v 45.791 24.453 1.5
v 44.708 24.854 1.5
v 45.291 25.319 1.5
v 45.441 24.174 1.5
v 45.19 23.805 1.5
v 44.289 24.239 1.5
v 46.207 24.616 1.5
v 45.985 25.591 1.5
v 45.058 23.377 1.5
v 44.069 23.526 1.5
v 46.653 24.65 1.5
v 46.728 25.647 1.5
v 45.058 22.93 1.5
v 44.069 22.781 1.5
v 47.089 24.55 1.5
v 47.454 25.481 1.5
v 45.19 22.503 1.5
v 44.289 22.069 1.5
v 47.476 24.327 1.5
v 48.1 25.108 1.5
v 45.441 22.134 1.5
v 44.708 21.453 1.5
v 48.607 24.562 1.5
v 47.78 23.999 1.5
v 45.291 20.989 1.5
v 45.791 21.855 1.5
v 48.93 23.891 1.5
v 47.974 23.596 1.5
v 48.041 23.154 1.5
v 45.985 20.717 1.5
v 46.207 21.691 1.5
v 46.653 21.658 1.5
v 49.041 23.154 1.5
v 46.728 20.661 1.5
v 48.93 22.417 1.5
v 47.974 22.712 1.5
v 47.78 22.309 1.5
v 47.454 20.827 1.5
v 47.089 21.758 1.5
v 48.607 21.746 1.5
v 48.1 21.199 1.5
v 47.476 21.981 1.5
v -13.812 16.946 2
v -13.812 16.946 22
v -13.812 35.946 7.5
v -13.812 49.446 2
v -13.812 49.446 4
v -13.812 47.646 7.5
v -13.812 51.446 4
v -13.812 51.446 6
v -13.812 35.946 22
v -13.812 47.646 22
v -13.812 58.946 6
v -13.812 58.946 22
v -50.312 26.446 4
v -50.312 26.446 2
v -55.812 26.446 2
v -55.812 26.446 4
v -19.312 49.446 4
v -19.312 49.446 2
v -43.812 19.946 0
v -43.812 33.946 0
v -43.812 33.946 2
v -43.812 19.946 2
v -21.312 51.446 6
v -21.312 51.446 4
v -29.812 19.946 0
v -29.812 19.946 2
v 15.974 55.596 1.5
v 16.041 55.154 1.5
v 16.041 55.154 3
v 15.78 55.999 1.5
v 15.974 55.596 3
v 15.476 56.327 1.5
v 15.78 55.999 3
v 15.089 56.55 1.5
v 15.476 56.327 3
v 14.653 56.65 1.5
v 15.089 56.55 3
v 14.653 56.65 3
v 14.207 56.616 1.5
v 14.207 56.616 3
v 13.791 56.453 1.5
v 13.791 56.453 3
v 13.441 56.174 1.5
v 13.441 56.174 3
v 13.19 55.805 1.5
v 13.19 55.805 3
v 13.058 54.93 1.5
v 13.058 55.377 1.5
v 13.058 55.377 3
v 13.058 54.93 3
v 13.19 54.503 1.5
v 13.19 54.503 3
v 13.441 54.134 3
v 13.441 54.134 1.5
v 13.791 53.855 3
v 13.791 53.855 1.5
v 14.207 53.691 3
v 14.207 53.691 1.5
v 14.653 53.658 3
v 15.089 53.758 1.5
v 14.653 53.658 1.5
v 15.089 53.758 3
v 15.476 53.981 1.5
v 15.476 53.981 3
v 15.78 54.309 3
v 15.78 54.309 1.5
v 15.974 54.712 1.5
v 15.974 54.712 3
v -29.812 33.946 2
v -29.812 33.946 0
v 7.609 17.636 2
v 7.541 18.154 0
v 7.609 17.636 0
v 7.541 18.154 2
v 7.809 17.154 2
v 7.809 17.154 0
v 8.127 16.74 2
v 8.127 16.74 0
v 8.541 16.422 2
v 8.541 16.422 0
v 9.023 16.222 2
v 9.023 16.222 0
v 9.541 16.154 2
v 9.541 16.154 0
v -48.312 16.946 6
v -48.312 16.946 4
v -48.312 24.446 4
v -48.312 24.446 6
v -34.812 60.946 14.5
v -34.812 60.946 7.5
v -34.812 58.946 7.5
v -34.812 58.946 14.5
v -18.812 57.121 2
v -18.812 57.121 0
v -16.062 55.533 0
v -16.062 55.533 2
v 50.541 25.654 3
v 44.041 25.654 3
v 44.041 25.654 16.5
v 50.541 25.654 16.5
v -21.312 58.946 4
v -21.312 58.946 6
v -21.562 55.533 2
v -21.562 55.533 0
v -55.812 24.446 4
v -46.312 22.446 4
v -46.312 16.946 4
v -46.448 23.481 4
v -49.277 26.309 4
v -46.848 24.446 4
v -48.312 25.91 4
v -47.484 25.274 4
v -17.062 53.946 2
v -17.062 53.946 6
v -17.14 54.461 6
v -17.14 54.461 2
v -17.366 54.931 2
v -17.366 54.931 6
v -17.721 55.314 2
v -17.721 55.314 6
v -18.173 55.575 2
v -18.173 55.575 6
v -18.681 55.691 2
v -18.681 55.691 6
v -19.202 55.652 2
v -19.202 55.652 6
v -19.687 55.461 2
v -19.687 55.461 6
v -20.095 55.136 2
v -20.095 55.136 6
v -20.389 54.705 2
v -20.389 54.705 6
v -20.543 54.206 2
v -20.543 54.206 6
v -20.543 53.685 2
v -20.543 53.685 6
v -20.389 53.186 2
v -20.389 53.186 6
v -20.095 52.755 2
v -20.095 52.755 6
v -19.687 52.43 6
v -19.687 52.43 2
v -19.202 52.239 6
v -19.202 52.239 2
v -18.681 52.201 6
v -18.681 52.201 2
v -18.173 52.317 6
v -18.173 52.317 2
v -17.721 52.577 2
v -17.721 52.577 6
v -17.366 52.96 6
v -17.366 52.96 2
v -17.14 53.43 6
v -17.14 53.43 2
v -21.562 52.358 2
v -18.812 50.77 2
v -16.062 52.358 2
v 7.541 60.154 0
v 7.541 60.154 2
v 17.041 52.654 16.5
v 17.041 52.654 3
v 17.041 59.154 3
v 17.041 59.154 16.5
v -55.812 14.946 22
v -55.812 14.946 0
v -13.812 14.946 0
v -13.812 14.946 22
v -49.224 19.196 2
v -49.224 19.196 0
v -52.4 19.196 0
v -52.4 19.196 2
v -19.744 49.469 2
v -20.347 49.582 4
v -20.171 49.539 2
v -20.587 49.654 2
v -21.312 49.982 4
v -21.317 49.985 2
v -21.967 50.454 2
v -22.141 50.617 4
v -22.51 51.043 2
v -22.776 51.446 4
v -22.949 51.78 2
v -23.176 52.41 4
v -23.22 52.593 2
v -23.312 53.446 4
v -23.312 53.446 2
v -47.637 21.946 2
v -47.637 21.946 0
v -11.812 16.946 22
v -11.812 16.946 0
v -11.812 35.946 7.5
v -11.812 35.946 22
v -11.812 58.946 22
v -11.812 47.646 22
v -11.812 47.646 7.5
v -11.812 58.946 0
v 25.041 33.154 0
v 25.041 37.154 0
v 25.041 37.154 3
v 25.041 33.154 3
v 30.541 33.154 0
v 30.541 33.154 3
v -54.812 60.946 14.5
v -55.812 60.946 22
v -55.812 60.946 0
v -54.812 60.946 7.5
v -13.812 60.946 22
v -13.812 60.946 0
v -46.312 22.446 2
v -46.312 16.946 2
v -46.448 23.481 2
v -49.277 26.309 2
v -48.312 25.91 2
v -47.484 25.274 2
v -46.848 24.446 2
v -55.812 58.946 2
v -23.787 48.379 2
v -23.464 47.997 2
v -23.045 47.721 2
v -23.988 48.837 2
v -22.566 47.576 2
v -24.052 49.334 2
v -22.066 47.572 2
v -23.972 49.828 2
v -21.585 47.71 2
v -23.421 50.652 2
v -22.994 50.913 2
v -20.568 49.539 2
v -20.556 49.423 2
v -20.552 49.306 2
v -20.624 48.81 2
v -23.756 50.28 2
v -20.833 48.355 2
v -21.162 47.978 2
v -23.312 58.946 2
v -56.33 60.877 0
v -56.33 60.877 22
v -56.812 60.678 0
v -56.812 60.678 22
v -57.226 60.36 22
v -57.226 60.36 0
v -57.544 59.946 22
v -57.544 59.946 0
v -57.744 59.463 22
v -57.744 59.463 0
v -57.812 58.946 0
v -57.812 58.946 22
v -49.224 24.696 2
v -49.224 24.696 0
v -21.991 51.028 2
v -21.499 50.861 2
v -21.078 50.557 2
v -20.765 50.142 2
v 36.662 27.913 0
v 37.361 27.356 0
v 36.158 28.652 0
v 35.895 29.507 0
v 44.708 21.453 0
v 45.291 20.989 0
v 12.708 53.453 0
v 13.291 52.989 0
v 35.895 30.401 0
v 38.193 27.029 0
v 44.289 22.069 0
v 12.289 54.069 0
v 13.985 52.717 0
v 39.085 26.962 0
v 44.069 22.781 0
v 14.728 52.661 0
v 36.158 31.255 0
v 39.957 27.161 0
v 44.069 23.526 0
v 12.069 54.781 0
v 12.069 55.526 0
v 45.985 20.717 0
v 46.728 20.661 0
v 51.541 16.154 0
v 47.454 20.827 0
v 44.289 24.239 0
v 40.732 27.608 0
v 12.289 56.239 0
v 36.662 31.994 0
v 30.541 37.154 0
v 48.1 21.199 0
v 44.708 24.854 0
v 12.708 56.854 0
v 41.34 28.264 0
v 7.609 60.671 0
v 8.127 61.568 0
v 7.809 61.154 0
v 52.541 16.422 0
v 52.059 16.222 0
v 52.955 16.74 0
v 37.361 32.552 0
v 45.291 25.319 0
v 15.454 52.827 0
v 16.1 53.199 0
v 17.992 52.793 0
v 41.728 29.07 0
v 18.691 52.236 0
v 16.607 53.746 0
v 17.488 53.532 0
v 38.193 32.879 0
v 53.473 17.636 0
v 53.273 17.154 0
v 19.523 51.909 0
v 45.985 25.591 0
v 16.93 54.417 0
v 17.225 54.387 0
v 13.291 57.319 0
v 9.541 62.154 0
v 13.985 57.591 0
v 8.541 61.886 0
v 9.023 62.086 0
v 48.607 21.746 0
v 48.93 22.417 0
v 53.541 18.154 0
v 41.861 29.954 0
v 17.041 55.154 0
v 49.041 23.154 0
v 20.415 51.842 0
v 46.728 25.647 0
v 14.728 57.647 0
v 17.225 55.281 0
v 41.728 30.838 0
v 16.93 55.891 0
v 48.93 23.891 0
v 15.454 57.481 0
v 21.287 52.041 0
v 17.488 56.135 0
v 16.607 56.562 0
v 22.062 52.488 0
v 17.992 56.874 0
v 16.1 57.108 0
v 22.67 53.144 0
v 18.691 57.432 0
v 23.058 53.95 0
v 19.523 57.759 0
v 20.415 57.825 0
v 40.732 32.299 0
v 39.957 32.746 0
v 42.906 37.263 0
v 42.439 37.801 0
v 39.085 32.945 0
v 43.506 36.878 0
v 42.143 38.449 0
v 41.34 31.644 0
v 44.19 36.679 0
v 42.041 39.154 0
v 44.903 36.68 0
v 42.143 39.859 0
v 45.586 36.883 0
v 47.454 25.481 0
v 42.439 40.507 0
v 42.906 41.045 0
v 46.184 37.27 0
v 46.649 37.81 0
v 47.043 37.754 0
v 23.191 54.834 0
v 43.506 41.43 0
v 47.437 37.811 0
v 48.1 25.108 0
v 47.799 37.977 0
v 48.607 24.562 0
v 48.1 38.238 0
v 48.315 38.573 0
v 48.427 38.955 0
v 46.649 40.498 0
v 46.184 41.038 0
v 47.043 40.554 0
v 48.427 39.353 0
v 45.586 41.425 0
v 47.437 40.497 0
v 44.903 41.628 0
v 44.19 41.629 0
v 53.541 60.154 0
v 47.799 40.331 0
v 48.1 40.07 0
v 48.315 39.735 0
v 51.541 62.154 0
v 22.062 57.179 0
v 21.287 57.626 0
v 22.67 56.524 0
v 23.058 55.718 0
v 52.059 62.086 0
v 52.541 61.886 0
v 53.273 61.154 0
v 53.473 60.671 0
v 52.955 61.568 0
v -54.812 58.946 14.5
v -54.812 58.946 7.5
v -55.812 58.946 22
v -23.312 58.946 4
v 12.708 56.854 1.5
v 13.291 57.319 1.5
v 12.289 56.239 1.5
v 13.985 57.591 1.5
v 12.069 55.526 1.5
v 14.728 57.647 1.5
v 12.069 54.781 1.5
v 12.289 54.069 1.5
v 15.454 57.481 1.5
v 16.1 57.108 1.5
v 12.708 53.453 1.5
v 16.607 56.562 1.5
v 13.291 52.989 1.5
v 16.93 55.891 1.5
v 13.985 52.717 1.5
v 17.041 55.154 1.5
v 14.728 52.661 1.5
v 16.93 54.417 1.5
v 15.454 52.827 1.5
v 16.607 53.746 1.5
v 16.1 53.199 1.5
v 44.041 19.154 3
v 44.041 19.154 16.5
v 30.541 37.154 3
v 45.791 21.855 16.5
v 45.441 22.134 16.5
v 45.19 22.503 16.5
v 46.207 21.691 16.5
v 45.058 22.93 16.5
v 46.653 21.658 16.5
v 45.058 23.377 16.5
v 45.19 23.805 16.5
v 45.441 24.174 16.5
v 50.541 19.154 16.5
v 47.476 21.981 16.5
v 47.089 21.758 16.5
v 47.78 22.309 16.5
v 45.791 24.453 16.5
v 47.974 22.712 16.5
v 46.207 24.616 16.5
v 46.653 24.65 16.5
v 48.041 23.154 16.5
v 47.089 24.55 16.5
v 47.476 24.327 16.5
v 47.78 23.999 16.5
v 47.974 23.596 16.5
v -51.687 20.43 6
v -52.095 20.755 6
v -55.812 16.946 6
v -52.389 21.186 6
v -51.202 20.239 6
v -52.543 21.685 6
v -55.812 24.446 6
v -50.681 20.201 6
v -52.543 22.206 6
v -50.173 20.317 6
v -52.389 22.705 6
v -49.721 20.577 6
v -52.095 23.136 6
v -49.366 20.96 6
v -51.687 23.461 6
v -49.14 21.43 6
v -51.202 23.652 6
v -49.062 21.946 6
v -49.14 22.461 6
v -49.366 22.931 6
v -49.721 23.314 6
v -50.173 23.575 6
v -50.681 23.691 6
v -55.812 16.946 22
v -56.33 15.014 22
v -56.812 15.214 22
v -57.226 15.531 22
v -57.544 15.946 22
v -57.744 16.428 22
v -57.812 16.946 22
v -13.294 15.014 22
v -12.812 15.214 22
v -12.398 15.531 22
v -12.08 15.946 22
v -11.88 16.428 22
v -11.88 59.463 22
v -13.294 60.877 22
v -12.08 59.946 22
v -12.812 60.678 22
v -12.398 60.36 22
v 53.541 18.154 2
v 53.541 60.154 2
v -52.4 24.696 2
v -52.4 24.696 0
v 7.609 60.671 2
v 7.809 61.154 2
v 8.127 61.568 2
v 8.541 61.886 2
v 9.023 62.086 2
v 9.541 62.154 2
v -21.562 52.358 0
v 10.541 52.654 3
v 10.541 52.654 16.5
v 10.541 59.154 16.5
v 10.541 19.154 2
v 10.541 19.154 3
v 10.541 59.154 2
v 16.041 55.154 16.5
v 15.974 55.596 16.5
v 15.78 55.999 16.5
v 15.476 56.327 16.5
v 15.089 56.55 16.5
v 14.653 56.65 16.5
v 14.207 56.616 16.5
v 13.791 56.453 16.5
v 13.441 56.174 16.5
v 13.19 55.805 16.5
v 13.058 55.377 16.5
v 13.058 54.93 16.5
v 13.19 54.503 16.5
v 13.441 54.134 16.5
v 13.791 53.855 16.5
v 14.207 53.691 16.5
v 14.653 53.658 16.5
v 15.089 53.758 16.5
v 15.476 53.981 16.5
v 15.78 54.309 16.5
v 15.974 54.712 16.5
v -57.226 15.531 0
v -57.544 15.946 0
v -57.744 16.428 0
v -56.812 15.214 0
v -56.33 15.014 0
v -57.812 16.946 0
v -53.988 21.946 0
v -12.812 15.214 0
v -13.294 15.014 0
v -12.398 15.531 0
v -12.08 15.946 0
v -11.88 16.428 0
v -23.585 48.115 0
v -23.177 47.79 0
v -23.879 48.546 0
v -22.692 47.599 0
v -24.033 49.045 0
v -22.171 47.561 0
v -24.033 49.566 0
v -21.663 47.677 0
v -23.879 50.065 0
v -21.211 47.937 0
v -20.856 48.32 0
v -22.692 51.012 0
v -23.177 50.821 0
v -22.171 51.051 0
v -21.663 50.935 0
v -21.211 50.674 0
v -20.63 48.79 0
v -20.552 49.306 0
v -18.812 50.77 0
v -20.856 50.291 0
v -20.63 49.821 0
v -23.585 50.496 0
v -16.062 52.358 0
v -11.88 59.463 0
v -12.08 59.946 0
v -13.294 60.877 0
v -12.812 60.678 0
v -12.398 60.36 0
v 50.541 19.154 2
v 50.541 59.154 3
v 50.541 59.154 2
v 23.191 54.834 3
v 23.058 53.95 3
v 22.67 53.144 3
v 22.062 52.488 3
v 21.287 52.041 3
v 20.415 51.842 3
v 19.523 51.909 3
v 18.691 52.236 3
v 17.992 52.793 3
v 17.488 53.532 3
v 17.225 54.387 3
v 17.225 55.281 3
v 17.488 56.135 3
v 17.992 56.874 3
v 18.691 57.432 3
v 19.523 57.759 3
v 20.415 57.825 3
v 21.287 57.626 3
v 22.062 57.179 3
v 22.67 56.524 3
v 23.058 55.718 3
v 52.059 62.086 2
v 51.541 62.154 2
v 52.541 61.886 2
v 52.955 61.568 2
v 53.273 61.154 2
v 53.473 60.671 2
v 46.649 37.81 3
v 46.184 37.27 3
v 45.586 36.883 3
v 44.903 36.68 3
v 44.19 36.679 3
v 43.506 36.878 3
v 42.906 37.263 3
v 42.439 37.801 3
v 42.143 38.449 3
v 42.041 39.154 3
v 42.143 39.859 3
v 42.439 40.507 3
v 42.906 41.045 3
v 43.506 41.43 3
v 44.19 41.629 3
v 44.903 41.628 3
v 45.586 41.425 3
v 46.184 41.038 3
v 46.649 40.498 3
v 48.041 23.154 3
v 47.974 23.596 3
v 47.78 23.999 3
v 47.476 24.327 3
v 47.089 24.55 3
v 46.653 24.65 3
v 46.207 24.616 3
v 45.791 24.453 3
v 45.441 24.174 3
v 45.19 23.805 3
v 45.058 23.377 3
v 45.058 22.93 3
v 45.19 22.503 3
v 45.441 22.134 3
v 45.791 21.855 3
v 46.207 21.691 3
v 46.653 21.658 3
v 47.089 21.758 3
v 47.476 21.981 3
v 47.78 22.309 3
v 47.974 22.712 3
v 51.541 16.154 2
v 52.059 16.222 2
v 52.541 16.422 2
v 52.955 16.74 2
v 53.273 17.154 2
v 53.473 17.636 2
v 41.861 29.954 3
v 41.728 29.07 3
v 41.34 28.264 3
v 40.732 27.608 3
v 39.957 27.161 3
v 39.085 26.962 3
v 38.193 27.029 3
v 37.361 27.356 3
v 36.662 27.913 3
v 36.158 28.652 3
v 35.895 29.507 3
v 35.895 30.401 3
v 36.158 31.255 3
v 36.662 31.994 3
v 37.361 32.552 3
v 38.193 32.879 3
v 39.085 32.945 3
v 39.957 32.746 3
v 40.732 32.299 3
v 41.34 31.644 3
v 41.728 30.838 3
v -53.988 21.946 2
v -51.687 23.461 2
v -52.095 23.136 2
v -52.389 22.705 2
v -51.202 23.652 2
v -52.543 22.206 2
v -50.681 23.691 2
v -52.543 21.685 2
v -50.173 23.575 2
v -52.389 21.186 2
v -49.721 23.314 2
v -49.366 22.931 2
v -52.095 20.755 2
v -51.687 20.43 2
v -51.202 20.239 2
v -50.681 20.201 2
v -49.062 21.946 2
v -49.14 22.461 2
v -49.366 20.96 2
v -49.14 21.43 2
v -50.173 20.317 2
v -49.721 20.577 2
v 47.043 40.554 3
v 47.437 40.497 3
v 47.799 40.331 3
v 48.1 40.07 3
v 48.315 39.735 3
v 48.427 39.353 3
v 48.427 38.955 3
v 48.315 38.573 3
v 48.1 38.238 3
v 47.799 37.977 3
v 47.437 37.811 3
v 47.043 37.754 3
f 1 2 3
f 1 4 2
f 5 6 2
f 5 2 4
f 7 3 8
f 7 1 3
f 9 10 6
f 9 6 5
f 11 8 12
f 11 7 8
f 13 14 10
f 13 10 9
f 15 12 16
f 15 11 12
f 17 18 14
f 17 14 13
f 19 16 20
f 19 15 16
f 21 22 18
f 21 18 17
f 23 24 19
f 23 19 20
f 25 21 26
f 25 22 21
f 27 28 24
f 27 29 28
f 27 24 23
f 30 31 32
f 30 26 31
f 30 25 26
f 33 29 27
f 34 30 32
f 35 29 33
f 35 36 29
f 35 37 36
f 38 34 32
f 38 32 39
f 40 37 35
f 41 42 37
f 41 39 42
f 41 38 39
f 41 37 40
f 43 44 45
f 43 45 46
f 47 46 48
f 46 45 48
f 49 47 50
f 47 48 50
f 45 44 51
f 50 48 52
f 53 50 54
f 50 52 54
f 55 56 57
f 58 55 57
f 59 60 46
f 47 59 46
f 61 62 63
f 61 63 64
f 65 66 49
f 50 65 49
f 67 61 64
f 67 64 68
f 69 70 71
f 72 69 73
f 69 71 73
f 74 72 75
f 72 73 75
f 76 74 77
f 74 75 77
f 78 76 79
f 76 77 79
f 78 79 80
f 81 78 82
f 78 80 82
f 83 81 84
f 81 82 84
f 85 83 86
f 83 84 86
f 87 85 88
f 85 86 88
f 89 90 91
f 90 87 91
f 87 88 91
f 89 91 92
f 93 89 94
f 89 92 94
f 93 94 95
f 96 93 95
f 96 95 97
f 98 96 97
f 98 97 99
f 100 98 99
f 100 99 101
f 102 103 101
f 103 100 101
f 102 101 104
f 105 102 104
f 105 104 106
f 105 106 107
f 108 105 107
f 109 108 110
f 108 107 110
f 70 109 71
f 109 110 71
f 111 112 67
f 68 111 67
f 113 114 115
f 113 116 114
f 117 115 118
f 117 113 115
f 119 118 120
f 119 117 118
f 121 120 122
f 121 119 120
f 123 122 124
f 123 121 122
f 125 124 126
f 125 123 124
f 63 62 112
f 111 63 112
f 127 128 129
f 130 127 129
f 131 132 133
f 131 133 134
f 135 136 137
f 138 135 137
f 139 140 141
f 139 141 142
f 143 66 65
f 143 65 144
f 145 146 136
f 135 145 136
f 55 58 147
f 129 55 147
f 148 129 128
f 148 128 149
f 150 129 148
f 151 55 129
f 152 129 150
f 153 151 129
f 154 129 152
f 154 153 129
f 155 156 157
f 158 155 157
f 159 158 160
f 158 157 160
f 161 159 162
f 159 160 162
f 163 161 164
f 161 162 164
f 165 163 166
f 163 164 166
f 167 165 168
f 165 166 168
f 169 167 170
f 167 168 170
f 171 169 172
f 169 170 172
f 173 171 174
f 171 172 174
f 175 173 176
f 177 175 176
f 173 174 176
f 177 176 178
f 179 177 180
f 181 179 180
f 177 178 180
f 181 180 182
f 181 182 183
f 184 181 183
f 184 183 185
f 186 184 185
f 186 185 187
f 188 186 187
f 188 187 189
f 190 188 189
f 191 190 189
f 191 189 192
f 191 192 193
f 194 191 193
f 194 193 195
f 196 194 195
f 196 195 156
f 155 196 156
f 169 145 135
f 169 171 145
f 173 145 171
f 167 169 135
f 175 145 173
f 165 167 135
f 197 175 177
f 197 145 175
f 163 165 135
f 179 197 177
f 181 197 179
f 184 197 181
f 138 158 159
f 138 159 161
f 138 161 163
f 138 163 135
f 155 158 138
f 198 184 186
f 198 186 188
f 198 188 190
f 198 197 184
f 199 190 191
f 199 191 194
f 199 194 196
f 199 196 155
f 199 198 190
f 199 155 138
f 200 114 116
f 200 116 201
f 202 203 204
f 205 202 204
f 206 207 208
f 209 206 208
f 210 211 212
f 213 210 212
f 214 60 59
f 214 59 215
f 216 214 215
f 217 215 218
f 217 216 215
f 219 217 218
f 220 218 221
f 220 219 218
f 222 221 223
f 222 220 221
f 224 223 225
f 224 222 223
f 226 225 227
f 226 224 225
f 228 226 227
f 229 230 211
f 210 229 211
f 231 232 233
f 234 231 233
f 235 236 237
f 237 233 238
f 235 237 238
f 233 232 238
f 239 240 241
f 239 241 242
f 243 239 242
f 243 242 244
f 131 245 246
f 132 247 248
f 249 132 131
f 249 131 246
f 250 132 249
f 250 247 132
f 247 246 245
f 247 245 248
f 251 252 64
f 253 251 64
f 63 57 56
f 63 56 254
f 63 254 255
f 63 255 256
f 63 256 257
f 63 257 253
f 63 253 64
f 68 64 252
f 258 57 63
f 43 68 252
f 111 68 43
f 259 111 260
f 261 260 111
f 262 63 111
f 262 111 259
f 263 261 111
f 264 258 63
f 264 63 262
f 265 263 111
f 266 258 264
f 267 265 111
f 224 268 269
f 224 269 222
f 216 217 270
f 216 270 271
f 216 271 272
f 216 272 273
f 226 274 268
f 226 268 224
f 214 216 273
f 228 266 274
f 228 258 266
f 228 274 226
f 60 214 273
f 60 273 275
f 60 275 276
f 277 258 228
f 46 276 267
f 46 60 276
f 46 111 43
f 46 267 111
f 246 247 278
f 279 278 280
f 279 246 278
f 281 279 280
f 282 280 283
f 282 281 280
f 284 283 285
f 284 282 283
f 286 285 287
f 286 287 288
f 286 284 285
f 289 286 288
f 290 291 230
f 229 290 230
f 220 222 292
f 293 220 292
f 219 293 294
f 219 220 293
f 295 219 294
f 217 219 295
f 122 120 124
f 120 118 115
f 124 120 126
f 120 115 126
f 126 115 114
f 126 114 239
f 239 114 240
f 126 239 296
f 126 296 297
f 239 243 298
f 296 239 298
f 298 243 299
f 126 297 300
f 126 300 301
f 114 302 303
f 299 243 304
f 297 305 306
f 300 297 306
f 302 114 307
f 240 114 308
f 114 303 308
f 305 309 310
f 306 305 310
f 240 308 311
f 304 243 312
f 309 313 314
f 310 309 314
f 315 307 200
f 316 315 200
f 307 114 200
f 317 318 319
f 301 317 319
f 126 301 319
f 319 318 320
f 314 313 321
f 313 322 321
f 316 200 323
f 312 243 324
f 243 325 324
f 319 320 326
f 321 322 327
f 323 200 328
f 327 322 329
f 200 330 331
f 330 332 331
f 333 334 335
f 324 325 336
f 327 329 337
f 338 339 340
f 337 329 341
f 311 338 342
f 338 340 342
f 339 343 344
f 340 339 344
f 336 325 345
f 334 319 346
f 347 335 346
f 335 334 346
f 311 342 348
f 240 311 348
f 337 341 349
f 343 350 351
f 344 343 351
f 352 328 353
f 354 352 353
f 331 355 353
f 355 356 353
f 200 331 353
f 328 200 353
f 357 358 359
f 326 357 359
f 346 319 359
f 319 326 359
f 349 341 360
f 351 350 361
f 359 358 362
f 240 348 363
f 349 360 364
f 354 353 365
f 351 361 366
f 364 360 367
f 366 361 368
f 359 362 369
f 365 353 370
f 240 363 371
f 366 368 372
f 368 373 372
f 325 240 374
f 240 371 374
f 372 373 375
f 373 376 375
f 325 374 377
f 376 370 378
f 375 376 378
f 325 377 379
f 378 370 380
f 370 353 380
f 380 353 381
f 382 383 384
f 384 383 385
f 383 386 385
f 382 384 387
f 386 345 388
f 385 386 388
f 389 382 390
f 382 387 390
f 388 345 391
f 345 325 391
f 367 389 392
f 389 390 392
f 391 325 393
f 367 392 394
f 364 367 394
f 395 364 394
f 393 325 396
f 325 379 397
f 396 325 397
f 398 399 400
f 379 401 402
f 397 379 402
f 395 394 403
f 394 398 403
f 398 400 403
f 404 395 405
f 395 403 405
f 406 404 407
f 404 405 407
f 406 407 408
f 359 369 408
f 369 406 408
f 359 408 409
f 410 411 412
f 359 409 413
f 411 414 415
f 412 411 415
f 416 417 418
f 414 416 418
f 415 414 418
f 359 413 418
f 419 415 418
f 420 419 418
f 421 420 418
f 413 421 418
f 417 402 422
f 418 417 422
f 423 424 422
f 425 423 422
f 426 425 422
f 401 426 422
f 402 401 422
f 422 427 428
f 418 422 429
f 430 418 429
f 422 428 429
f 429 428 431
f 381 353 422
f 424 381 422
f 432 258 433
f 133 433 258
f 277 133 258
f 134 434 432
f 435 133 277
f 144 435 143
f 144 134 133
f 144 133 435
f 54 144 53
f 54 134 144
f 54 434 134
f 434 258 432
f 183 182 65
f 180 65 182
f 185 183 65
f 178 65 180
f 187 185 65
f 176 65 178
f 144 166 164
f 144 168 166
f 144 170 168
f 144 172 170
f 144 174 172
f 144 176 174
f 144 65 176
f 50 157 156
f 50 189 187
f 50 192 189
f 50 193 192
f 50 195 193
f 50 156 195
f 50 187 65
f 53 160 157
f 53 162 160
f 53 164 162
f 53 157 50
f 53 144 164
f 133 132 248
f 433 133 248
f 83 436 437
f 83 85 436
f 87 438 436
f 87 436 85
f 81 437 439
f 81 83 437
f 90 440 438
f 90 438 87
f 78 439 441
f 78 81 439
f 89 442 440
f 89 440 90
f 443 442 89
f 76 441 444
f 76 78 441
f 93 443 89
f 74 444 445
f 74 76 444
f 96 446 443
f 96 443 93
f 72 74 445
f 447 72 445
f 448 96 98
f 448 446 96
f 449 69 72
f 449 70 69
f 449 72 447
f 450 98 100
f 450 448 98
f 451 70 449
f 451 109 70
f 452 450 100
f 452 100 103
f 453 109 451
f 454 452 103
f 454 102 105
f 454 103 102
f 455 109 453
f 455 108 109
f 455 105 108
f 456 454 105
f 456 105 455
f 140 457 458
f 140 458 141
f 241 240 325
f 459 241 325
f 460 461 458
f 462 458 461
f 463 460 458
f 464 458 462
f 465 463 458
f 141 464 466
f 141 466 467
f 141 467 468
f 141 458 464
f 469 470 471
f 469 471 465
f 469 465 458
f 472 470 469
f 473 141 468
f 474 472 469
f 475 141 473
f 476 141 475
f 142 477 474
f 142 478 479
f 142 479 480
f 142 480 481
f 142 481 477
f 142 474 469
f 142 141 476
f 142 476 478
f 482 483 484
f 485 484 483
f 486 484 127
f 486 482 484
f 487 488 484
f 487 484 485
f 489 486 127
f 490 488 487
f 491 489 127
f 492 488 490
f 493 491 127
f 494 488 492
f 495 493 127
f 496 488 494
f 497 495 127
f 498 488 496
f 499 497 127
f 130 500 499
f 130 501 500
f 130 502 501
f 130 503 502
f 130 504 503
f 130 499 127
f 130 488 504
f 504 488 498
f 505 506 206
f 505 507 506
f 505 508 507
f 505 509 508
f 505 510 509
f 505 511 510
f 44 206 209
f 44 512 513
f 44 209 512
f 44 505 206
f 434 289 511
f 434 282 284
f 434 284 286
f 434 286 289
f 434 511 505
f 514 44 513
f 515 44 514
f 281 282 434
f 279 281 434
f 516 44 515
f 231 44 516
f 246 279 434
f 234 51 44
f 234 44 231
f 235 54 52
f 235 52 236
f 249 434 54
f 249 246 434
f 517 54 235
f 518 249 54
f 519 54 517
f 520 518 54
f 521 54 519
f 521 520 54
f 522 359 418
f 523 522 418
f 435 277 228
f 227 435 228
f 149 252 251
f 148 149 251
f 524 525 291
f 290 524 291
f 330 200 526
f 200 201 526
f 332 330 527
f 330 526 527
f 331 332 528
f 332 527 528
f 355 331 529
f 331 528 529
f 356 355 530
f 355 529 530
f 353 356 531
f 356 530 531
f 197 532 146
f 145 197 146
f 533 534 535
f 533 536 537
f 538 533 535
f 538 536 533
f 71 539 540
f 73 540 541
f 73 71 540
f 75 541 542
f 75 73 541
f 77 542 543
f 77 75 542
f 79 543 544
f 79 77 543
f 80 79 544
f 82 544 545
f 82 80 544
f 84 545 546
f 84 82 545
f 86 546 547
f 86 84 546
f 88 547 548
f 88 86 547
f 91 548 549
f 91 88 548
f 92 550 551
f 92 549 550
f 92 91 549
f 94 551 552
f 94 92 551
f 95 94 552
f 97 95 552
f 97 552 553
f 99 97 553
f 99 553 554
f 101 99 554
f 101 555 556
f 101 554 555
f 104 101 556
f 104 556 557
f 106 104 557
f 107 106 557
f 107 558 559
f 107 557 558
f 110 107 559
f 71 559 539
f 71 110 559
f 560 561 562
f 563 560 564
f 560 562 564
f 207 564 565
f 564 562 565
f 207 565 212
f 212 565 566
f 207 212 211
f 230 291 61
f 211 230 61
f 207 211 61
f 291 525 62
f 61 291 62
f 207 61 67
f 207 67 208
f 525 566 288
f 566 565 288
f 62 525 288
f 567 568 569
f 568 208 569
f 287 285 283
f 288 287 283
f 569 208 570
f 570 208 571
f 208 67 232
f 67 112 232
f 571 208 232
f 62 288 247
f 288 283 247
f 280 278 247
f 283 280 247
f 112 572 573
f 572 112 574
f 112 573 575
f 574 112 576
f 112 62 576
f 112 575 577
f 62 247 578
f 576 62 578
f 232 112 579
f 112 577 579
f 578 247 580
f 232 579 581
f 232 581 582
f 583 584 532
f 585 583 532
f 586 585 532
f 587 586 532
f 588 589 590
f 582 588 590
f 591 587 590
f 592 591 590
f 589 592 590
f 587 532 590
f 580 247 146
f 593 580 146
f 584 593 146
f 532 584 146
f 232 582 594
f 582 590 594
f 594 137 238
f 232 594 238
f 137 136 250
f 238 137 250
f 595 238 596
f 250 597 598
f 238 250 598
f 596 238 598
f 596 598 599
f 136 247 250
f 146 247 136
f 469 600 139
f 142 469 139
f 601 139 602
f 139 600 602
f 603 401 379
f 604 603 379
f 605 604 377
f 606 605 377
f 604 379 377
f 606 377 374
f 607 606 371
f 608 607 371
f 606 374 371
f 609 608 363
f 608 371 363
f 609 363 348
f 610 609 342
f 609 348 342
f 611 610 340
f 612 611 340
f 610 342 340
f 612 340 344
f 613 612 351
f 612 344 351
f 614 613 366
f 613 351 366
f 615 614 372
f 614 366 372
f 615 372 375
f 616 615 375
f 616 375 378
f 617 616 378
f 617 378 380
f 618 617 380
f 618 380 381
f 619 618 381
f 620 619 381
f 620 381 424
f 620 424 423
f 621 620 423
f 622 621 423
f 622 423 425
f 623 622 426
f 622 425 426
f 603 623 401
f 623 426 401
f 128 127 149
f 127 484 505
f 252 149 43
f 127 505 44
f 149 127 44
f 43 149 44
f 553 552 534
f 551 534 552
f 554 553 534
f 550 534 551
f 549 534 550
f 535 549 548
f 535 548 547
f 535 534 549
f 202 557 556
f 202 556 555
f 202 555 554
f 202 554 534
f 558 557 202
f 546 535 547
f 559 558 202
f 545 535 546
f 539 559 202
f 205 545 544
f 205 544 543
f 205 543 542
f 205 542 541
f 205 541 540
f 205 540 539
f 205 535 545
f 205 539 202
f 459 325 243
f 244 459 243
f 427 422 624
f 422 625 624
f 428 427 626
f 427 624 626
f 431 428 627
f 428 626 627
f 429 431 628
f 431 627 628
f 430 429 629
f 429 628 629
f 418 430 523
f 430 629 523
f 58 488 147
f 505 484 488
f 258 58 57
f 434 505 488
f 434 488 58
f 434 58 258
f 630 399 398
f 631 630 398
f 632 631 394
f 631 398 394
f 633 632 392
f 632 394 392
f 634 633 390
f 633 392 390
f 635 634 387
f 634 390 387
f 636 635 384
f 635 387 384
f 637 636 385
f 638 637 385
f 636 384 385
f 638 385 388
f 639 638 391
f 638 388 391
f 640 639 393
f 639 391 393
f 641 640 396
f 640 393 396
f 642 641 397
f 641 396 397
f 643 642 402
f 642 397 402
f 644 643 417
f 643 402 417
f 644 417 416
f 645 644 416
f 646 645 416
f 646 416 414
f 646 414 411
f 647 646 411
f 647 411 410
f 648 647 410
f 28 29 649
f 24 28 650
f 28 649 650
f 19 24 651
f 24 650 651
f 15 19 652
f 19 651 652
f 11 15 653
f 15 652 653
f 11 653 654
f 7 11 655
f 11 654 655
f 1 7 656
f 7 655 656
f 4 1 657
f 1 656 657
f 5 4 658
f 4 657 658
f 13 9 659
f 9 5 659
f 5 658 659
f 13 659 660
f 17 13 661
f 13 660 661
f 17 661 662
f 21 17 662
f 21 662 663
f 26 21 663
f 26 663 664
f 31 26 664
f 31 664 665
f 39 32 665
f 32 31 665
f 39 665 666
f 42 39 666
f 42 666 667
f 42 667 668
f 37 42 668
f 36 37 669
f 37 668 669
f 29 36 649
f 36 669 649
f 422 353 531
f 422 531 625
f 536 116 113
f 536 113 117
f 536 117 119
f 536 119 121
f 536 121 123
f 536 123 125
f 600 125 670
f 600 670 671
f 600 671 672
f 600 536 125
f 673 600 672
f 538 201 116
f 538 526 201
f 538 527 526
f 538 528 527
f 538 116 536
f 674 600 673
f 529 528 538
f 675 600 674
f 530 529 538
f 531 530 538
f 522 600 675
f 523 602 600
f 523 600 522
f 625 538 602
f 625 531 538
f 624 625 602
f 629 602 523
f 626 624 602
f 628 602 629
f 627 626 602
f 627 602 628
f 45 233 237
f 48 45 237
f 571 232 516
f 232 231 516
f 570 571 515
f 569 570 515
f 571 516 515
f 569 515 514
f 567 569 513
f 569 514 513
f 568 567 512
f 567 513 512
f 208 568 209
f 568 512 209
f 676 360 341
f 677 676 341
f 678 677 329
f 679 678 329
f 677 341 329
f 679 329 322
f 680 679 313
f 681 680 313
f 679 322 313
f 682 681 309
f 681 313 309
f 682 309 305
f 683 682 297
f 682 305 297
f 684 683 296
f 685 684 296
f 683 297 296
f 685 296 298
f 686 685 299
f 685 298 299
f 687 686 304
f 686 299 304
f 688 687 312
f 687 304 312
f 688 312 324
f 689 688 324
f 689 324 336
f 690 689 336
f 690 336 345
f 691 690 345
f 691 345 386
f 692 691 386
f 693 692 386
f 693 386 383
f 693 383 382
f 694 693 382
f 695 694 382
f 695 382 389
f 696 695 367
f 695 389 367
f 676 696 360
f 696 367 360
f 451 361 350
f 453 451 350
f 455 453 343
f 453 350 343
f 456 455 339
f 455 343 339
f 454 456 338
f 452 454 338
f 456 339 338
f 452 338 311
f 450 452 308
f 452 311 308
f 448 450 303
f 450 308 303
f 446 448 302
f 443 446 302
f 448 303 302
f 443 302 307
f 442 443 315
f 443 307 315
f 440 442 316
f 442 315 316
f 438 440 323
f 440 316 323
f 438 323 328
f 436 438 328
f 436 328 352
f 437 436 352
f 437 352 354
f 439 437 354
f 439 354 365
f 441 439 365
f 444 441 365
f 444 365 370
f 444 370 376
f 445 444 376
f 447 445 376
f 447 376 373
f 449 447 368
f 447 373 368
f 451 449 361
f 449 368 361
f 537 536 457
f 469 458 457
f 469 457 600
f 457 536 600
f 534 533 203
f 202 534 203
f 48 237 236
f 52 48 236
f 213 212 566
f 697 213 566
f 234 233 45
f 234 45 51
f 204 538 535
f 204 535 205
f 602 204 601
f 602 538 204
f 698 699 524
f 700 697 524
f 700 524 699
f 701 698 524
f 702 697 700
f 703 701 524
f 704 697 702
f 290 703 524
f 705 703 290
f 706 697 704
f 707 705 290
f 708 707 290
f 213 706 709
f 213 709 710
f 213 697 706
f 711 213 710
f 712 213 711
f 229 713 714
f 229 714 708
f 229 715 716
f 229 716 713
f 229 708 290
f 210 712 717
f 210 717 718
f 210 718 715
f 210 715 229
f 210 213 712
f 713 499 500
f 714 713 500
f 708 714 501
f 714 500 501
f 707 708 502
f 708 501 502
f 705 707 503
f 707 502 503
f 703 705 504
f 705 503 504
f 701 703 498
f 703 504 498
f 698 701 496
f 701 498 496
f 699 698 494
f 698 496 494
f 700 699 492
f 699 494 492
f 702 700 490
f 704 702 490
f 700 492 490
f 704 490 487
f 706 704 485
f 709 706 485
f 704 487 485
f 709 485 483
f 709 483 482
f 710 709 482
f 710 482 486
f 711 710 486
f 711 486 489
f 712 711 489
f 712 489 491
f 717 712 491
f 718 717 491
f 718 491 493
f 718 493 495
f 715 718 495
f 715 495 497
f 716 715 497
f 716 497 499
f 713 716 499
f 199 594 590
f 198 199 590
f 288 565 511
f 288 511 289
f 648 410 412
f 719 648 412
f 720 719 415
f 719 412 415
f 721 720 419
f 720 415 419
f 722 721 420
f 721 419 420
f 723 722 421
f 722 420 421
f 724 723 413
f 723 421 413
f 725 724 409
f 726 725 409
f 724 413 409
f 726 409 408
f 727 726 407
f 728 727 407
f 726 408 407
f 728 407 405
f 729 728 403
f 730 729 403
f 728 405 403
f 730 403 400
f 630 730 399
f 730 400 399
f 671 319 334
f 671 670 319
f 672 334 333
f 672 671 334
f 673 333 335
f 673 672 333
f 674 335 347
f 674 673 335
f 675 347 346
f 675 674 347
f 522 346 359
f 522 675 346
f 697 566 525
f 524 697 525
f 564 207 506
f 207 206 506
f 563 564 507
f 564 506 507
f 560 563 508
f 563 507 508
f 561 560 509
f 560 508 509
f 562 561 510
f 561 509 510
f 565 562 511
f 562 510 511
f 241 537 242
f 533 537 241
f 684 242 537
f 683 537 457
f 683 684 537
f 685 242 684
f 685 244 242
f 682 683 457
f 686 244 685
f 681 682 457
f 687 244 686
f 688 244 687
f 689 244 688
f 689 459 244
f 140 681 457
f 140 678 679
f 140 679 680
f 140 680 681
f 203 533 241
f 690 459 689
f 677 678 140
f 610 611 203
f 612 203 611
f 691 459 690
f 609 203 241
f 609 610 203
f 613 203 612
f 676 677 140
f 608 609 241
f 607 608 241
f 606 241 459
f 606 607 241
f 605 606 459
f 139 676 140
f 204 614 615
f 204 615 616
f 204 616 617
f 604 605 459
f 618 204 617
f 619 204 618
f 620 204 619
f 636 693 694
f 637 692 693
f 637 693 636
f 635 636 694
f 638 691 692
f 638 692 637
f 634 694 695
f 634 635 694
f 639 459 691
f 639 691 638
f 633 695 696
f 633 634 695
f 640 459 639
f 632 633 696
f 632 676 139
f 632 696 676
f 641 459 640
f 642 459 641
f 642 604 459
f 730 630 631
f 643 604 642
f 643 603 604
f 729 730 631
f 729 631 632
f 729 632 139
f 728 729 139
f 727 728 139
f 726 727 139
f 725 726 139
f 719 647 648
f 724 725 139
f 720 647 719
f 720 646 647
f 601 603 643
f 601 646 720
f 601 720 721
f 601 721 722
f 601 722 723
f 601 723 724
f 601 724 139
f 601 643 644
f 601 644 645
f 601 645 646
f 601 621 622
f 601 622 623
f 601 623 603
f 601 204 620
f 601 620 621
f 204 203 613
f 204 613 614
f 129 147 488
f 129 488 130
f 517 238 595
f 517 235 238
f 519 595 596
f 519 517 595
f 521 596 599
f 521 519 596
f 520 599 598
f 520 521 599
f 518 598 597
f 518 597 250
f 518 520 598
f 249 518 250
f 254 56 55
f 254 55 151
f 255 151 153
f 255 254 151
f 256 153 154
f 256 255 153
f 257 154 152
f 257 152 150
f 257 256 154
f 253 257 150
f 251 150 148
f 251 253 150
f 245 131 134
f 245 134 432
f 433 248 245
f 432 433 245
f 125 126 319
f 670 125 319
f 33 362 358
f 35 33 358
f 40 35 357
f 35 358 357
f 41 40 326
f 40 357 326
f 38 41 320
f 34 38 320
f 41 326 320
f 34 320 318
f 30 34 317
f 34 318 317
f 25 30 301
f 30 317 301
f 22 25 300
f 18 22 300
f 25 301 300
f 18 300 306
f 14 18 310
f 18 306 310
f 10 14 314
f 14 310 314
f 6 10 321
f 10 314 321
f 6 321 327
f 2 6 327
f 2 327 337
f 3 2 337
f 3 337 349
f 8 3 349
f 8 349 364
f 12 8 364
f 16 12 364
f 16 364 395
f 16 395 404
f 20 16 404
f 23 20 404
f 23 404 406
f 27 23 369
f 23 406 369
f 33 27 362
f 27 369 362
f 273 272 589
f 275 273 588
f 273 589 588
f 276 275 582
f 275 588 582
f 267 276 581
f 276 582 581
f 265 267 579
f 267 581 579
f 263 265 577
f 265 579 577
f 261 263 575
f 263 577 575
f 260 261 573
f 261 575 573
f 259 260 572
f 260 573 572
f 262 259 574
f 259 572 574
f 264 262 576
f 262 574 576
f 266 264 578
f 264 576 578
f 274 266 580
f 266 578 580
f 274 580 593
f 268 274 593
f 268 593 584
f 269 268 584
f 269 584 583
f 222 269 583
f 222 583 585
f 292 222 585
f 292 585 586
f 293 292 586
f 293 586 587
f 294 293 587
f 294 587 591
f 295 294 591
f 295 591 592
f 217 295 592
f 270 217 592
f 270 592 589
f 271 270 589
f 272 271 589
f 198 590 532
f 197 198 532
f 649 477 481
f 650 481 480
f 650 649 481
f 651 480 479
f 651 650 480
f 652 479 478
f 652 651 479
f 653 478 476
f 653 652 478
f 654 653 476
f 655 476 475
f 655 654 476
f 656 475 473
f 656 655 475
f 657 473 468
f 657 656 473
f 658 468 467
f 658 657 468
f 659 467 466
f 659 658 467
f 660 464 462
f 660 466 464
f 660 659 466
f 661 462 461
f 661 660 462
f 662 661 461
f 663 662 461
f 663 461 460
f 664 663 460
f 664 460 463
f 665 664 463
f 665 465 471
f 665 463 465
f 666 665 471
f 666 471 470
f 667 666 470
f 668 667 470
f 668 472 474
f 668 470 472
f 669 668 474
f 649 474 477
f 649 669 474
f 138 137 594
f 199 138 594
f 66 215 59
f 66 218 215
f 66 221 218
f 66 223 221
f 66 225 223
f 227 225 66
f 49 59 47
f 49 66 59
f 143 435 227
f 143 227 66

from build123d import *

# Parameters (mm, degrees)
F0_W         = 46
F0_H         = 46
F1_DEPTH     = 22
F2_W         = 42
F2_H         = 42
F3_DEPTH     = 20
F4_W         = 7.5
F4_H         = 7.5
F5_DEPTH     = 4
F7_W         = 2
F7_H         = 7.5
F8_DEPTH     = 2
F10_DEPTH    = 2
F11_W        = 46
F11_H        = 46
F12_DEPTH    = 2
F13_W        = 40
F13_H        = 40
F14_DEPTH    = 1
F15_W        = 6.5
F15_H        = 6.5
F16_DEPTH    = 13.5
F17_R        = 1.5
F18_DEPTH    = 25
F19_DEPTH    = 25
F20_W        = 11.7
F20_H        = 14.5
F21_DEPTH    = 2
F22_W        = 20
F22_H        = 7
F23_DEPTH    = 2
F24_R        = 3
F24_W        = 5.5
F24_H        = 4
F25_DEPTH    = 3
F26_W        = 14
F26_H        = 14
F26_R        = 1.75
F28_DEPTH    = 2
F27_R        = 2.5
F27_R_2      = 1.5
F29_DEPTH    = 1.5
F6_R         = 1.75
F30_DEPTH    = 25
F31_T1_DEPTH = 12
F32_R        = 2
F32_2_R      = 2


# Not quite as in the source:
# - a fillet or chamfer that OpenCascade refuses, or shapes differently, is made with other operations: its cross-section is extruded or revolved along the edge and cut away or added
# - a feature names something its author has since deleted; it is built from what else it names


with BuildPart() as f1:
    # F0 (on Top) → F1 (new body)
    with BuildSketch(Plane.XY):
        with Locations((-34.8121308275, 37.9456170828)):
            Rectangle(F0_W, F0_H)
    extrude(amount=F1_DEPTH)

    # F2 (on face) → F3 (cut)
    with BuildSketch(Plane.XY.offset(22)):
        with Locations((-34.8121308275, 37.9456170828)):
            Rectangle(F2_W, F2_H)
    extrude(amount=-F3_DEPTH, mode=Mode.SUBTRACT)

    # F4 (on face) → F5 (join)
    with BuildSketch(Plane.XY.offset(2)):
        with Locations((-52.0621308275, 20.6956170828)):
            Rectangle(F4_W, F4_H)
        with Locations((-17.5621308275, 55.1956170828)):
            Rectangle(F4_W, F4_H)
    extrude(amount=F5_DEPTH)

    # F7 (on face) → F8 (join)
    with BuildSketch(Plane.XY.offset(2)):
        Polygon((-46.3121308275, 26.4456170828), (-55.8121308275, 26.4456170828), (-55.8121308275, 24.4456170828), (-48.3121308275, 24.4456170828), (-46.3121308275, 24.4456170828), align=None)
        with Locations((-47.3121308275, 20.6956170828)):
            Rectangle(F7_W, F7_H)
        with Locations((-22.3121308275, 55.1956170828)):
            Rectangle(F7_W, F7_H)
        Polygon((-13.8121308275, 51.4456170828), (-21.3121308275, 51.4456170828), (-23.3121308275, 51.4456170828), (-23.3121308275, 49.4456170828), (-13.8121308275, 49.4456170828), align=None)
    extrude(amount=F8_DEPTH)

    # F9 (on face) → F10 (cut)
    with BuildSketch(Plane(origin=(0, 0, 0), x_dir=(1, 0, 0), z_dir=(0, 0, -1))):
        Polygon((-16.0621308275, -55.5333303231), (-16.0621308275, -52.3579038425), (-18.8121308275, -50.7701906023), (-21.5621308275, -52.3579038425), (-21.5621308275, -55.5333303231), (-18.8121308275, -57.1210435634), align=None)
        Polygon((-47.6367043469, -21.9456170828), (-49.2244175872, -19.1956170828), (-52.3998440677, -19.1956170828), (-53.987557308, -21.9456170828), (-52.3998440677, -24.6956170828), (-49.2244175872, -24.6956170828), align=None)
    extrude(amount=-F10_DEPTH, mode=Mode.SUBTRACT)

    # F20 (on face) → F21 (cut)
    with BuildSketch(Plane.YZ.offset(-11.8121308275)):
        with Locations((41.7956170828, 14.75)):
            Rectangle(F20_W, F20_H)
    extrude(amount=-F21_DEPTH, mode=Mode.SUBTRACT)

    # F22 (on face) → F23 (cut)
    with BuildSketch(Plane(origin=(0, 60.9456170828, 0), x_dir=(-1, 0, 0), z_dir=(0, 1, 0))):
        with Locations((44.8121308275, 11)):
            Rectangle(F22_W, F22_H)
    extrude(amount=-F23_DEPTH, mode=Mode.SUBTRACT)

    # F26 (on face) → F28 (cut)
    with BuildSketch(Plane(origin=(0, 0, 0), x_dir=(1, 0, 0), z_dir=(0, 0, -1))):
        with Locations((-36.8121308275, -26.9456170828)):
            Rectangle(F26_W, F26_H)
        with Locations((-22.3021308275, -49.3056170828)):
            Circle(F26_R)
    extrude(amount=-F28_DEPTH, mode=Mode.SUBTRACT)

    # F6 (on face) → F30 (cut)
    with BuildSketch(Plane.XY.offset(22)):
        with Locations((-18.8121308275, 53.9456170828)):
            Circle(F6_R)
        with Locations((-50.8121308275, 21.9456170828)):
            Circle(F6_R)
    extrude(amount=-F30_DEPTH, mode=Mode.SUBTRACT)

    # F31: fillet of radius 4 on 2 edges, made by hand

    # F31_s2 → F31_t1 (cut)
    with BuildSketch(Plane.XY.offset(2)):
        with BuildLine():
            ThreePointArc((-50.3121308275, 26.4456170828), (-47.4837037027, 25.2740442076), (-46.3121308275, 22.4456170828))
            Line((-46.3121308275, 22.4456170828), (-46.3121308275, 26.4456170828))
            Line((-46.3121308275, 26.4456170828), (-50.3121308275, 26.4456170828))
        make_face()
        with BuildLine():
            ThreePointArc((-19.3121308275, 49.4456170828), (-22.1405579522, 50.6171899581), (-23.3121308275, 53.4456170828))
            Line((-23.3121308275, 53.4456170828), (-23.3121308275, 49.4456170828))
            Line((-23.3121308275, 49.4456170828), (-19.3121308275, 49.4456170828))
        make_face()
    extrude(amount=F31_T1_DEPTH, mode=Mode.SUBTRACT)

    # F32
    f32_edges = [f1.edges().sort_by_distance(p)[0] for p in [
        (-57.812131, 14.945617, 11),
        (-57.812131, 60.945617, 11),
        (-11.812131, 60.945617, 11),
        (-11.812131, 14.945617, 11),
    ]]
    fillet(f32_edges, radius=F32_R)


with BuildPart() as f12:
    # F11 (on Top) → F12 (new body)
    with BuildSketch(Plane.XY):
        with Locations((30.5410524812, 39.1538485997)):
            Rectangle(F11_W, F11_H)
    extrude(amount=F12_DEPTH)

    # F13 (on face) → F14 (join)
    with BuildSketch(Plane.XY.offset(2)):
        with Locations((30.5410524812, 39.1538485997)):
            Rectangle(F13_W, F13_H)
    extrude(amount=F14_DEPTH)

    # F15 (on face) → F16 (join)
    with BuildSketch(Plane.XY.offset(3)):
        with Locations((13.7910524812, 55.9038485997)):
            Rectangle(F15_W, F15_H)
        with Locations((47.2910524812, 22.4038485997)):
            Rectangle(F15_W, F15_H)
    extrude(amount=F16_DEPTH)

    # F17 (on face) → F18 (cut)
    with BuildSketch(Plane.XY.offset(3)):
        with Locations((14.5410524812, 55.1538485997)):
            Circle(F17_R)
        with Locations((46.5410524812, 23.1538485997)):
            Circle(F17_R)
    extrude(amount=F18_DEPTH, mode=Mode.SUBTRACT)

    # F17 (on face) → F19 (cut)
    with BuildSketch(Plane.XY.offset(3)):
        with Locations((14.5410524812, 55.1538485997)):
            Circle(F17_R)
        with Locations((46.5410524812, 23.1538485997)):
            Circle(F17_R)
    extrude(amount=-F19_DEPTH, mode=Mode.SUBTRACT)

    # F24 (on face) → F25 (cut)
    with BuildSketch(Plane(origin=(0, 0, 0), x_dir=(1, 0, 0), z_dir=(0, 0, -1))):
        with Locations((38.8610524812, -29.9538485997)):
            Circle(F24_R)
        with Locations((27.7910524812, -35.1538485997)):
            Rectangle(F24_W, F24_H)
        with Locations((20.1910524812, -54.8338485997)):
            Circle(F24_R)
        with BuildLine():
            ThreePointArc((46.6490524812, -40.4978485997), (45.6410524812, -39.1538485997), (46.6490524812, -37.8098485997))
            ThreePointArc((46.6490524812, -37.8098485997), (42.0410524812, -39.1538485997), (46.6490524812, -40.4978485997))
        make_face()
        with BuildLine():
            ThreePointArc((46.6490524812, -37.8098485997), (46.9410524812, -38.4538485997), (47.0410524812, -39.1538485997))
            ThreePointArc((47.0410524812, -39.1538485997), (46.9410524812, -39.8538485997), (46.6490524812, -40.4978485997))
            ThreePointArc((46.6490524812, -40.4978485997), (47.8810524812, -40.2738485997), (48.4410524812, -39.1538485997))
            ThreePointArc((48.4410524812, -39.1538485997), (47.8810524812, -38.0338485997), (46.6490524812, -37.8098485997))
        make_face()
        with BuildLine():
            ThreePointArc((46.6490524812, -40.4978485997), (46.9410524812, -39.8538485997), (47.0410524812, -39.1538485997))
            ThreePointArc((47.0410524812, -39.1538485997), (46.9410524812, -38.4538485997), (46.6490524812, -37.8098485997))
            ThreePointArc((46.6490524812, -37.8098485997), (45.6410524812, -39.1538485997), (46.6490524812, -40.4978485997))
        make_face()
    extrude(amount=-F25_DEPTH, mode=Mode.SUBTRACT)

    # F27 (on face) → F29 (cut)
    with BuildSketch(Plane(origin=(0, 0, 0), x_dir=(1, 0, 0), z_dir=(0, 0, -1))):
        with Locations((14.5410524812, -55.1538485997)):
            Circle(F27_R)
        with Locations((14.5410524812, -55.1538485997)):
            Circle(F27_R_2, mode=Mode.SUBTRACT)
        with Locations((46.5410524812, -23.1538485997)):
            Circle(F27_R)
        with Locations((46.5410524812, -23.1538485997)):
            Circle(F27_R_2, mode=Mode.SUBTRACT)
    extrude(amount=-F29_DEPTH, mode=Mode.SUBTRACT)

    # F32#2
    f32_2_edges = [f12.edges().sort_by_distance(p)[0] for p in [
        (7.541052, 16.153849, 1),
        (7.541052, 62.153849, 1),
        (53.541052, 62.153849, 1),
        (53.541052, 16.153849, 1),
    ]]
    fillet(f32_2_edges, radius=F32_2_R)


solid = Compound([f1.part, f12.part])
